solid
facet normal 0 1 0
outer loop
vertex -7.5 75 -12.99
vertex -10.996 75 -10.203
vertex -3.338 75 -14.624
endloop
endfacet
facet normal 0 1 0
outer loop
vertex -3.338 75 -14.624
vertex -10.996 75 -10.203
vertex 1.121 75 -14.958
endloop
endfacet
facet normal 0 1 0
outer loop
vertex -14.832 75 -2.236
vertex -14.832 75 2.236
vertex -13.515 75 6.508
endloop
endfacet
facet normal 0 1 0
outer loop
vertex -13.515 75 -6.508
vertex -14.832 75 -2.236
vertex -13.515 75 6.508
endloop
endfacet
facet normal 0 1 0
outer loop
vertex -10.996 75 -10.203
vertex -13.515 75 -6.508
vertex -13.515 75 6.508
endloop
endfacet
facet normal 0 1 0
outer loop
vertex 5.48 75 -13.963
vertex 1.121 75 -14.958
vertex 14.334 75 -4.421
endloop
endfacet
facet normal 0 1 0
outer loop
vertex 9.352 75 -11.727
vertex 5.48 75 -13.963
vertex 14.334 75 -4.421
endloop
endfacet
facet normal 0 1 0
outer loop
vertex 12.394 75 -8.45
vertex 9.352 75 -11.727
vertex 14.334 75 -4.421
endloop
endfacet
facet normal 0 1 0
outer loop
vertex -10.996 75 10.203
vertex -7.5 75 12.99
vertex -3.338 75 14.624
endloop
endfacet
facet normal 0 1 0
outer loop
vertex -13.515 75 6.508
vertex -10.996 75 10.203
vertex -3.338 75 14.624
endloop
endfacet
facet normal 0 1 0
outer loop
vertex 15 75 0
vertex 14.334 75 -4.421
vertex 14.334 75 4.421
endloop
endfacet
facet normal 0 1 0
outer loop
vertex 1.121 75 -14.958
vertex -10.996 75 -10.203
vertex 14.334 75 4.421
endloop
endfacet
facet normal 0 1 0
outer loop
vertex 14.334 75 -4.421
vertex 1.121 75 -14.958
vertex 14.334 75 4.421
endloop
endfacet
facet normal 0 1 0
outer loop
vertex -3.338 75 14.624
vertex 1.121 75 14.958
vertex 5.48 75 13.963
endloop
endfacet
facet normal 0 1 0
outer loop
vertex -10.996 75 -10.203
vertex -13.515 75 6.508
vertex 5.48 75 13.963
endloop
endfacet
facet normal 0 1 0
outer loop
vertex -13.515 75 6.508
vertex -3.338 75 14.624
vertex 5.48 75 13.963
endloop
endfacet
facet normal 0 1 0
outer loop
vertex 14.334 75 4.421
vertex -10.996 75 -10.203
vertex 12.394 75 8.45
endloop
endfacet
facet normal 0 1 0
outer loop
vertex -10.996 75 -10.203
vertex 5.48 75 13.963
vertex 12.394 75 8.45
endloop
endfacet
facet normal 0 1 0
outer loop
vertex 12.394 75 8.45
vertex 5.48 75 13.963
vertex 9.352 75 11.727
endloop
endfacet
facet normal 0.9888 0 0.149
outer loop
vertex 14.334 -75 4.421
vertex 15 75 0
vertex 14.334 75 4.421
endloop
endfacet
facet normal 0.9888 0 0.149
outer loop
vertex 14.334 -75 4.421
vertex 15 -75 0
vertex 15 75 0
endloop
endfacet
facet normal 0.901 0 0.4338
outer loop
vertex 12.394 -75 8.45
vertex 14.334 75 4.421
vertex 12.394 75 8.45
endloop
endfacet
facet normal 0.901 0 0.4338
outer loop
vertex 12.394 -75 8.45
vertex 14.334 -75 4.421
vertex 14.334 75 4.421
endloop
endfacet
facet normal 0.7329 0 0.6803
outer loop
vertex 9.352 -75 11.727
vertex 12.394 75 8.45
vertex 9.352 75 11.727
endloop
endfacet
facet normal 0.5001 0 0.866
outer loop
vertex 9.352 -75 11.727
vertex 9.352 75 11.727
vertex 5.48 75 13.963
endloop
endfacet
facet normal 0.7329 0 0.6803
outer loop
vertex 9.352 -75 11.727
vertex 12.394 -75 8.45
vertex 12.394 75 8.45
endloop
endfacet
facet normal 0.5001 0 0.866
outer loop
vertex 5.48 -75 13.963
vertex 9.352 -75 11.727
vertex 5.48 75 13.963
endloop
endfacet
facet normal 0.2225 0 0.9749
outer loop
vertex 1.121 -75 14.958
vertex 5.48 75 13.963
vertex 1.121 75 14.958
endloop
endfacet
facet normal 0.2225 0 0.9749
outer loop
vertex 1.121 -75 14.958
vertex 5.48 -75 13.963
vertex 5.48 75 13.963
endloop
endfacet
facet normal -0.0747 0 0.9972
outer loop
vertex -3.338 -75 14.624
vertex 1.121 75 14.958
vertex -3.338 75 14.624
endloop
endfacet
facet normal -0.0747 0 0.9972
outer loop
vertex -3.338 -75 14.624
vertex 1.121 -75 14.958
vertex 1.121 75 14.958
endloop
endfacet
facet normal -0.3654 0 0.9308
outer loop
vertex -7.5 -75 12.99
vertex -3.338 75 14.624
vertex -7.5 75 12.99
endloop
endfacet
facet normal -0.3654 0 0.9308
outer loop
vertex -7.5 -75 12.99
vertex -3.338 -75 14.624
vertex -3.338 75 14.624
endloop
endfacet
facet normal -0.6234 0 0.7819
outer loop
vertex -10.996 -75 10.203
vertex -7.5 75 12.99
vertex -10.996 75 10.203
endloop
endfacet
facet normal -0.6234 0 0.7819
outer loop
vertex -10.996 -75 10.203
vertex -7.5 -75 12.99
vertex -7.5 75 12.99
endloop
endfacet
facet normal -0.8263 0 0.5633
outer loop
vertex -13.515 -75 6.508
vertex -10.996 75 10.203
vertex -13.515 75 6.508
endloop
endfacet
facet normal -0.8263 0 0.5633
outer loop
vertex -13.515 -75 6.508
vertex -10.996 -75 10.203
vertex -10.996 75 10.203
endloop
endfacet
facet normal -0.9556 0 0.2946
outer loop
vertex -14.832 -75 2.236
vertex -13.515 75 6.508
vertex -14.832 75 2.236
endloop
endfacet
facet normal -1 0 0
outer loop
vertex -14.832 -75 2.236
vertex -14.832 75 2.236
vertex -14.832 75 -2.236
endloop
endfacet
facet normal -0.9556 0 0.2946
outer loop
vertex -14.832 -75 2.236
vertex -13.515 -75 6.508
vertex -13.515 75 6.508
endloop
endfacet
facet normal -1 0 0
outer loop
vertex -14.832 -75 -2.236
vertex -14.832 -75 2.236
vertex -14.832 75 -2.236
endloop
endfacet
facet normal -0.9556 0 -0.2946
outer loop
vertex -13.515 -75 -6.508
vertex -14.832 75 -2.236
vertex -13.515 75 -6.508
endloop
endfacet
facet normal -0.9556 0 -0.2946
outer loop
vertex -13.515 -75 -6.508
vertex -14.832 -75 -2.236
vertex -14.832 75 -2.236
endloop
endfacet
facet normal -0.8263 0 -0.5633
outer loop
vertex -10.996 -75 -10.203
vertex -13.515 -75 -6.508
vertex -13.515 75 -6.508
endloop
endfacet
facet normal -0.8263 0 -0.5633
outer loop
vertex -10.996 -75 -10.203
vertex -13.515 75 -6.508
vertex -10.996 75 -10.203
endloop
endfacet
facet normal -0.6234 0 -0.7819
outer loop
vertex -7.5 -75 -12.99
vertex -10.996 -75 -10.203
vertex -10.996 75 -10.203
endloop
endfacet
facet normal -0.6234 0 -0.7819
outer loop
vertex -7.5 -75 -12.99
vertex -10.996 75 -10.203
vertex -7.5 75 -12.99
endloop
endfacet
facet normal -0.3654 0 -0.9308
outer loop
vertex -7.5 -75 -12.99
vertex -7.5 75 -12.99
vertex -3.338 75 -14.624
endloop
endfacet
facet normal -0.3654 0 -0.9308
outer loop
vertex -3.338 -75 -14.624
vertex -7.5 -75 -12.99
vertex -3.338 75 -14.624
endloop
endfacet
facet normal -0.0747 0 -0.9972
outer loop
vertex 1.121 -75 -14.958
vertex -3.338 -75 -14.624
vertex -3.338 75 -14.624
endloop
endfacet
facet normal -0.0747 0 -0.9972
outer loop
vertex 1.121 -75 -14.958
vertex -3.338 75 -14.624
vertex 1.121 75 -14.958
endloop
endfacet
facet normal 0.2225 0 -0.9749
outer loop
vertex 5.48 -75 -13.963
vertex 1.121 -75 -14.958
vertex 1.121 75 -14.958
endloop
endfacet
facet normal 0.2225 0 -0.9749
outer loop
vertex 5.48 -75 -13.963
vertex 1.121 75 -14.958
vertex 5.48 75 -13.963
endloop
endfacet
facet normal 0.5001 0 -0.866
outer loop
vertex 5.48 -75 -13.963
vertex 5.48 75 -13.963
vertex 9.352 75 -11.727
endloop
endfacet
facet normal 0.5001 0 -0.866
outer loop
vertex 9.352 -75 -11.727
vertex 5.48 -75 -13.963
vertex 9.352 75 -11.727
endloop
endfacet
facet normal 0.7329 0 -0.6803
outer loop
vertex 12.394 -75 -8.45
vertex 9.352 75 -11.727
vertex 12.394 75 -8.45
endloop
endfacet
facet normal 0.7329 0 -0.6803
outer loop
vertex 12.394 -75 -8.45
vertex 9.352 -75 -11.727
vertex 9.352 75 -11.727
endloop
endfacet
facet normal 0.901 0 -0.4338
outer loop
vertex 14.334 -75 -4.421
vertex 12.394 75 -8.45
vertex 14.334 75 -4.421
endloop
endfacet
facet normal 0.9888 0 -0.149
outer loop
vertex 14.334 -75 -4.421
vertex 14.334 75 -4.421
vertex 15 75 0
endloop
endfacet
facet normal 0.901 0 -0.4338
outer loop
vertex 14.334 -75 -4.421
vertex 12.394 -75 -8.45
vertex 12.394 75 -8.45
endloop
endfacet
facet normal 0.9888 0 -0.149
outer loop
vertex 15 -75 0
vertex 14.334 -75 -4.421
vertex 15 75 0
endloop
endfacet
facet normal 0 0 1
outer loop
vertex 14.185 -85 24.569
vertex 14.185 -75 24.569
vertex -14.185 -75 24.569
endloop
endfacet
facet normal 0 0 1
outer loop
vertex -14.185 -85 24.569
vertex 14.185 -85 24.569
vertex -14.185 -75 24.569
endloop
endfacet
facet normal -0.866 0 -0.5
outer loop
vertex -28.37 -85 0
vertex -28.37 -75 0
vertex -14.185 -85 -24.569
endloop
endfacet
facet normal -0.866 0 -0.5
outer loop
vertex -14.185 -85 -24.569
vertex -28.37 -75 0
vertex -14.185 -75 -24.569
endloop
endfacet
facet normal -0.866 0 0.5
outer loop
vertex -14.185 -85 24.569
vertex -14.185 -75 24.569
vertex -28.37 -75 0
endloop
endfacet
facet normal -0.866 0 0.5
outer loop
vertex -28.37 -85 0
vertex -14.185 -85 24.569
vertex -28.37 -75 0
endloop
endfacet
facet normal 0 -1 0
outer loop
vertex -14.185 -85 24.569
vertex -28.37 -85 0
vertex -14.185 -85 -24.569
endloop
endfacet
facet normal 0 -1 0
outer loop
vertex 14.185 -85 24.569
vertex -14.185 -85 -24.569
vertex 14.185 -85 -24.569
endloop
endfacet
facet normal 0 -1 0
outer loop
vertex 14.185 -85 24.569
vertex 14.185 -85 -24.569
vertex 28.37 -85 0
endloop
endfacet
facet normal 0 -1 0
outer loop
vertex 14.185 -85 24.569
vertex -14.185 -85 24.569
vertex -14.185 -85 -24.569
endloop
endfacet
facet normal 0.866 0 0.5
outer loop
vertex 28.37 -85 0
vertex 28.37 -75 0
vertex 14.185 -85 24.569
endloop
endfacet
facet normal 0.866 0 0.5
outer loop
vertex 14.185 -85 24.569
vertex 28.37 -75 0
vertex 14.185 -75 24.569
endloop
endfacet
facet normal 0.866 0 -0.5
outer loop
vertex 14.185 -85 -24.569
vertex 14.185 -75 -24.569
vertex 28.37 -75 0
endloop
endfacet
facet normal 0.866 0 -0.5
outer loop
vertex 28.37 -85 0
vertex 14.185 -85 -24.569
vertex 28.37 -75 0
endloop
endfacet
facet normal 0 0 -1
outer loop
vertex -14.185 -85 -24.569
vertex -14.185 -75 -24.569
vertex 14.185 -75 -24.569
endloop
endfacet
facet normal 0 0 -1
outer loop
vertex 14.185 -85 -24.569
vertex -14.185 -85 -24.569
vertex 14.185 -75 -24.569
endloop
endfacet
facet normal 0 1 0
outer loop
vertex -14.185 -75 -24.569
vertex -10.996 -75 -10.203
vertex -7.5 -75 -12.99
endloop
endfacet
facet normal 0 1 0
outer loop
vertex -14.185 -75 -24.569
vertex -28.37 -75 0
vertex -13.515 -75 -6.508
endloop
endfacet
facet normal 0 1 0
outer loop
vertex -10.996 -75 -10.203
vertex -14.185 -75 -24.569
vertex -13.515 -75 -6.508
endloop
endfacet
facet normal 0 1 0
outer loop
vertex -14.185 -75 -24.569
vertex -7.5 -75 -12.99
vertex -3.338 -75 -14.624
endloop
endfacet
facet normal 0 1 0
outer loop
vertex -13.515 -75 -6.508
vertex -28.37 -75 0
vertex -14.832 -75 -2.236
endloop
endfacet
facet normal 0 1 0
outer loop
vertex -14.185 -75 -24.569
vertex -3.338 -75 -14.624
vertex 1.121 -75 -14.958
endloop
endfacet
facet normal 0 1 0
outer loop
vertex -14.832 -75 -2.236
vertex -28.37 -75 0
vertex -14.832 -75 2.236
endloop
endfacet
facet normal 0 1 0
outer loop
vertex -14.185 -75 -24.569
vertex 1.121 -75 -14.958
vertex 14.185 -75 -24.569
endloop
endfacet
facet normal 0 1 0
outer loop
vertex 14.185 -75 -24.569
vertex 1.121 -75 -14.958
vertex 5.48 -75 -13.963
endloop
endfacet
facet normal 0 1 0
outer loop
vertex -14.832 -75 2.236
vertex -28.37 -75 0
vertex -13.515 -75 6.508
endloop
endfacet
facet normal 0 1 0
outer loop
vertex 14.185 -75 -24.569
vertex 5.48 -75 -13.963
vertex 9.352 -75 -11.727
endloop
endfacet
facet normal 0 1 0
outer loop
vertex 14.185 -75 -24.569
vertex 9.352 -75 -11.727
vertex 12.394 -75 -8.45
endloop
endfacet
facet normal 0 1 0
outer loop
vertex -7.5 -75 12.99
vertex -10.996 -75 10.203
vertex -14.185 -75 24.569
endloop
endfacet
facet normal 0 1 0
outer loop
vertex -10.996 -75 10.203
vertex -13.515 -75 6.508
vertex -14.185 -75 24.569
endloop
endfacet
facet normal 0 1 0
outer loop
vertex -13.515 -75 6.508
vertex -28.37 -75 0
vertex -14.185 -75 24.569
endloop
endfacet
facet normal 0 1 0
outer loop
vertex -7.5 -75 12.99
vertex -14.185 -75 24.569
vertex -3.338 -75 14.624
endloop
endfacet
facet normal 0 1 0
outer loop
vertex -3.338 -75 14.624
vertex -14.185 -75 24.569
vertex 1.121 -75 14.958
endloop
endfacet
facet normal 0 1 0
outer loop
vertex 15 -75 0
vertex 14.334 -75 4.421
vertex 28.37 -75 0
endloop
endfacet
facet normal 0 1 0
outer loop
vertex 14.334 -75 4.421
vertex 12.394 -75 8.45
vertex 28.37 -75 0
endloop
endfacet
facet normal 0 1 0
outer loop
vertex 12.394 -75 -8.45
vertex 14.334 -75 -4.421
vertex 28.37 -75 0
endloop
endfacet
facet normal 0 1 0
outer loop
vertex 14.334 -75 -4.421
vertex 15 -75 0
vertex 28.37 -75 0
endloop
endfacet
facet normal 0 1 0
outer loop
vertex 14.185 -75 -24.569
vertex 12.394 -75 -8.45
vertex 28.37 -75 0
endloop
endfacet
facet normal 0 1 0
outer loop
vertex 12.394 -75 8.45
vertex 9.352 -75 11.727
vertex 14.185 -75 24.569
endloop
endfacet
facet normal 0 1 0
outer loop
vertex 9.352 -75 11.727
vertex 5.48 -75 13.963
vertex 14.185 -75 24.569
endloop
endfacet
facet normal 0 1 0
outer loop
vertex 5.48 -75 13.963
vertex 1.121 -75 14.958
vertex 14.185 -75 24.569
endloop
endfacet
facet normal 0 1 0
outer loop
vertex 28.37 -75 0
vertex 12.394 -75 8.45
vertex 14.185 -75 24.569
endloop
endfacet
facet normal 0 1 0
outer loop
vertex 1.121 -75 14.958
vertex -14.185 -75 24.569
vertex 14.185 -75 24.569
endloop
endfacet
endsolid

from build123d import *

# Parameters (mm, degrees)
F0_R     = 15
F1_DEPTH = 75
F3_DEPTH = 10


with BuildPart() as f1:
    # F0 (on Front) → F1 (new body, symmetric)
    with BuildSketch(Plane.XZ):
        Circle(F0_R)
    extrude(amount=F1_DEPTH, both=True)

    # F2 (on face) → F3 (join)
    with BuildSketch(Plane.XZ.offset(75)):
        Polygon((28.369565, 0), (14.184782, 24.568764), (-14.184782, 24.568764), (-28.369565, 0), (-14.184782, -24.568764), (14.184782, -24.568764), align=None)
    extrude(amount=F3_DEPTH)


solid = f1.part
